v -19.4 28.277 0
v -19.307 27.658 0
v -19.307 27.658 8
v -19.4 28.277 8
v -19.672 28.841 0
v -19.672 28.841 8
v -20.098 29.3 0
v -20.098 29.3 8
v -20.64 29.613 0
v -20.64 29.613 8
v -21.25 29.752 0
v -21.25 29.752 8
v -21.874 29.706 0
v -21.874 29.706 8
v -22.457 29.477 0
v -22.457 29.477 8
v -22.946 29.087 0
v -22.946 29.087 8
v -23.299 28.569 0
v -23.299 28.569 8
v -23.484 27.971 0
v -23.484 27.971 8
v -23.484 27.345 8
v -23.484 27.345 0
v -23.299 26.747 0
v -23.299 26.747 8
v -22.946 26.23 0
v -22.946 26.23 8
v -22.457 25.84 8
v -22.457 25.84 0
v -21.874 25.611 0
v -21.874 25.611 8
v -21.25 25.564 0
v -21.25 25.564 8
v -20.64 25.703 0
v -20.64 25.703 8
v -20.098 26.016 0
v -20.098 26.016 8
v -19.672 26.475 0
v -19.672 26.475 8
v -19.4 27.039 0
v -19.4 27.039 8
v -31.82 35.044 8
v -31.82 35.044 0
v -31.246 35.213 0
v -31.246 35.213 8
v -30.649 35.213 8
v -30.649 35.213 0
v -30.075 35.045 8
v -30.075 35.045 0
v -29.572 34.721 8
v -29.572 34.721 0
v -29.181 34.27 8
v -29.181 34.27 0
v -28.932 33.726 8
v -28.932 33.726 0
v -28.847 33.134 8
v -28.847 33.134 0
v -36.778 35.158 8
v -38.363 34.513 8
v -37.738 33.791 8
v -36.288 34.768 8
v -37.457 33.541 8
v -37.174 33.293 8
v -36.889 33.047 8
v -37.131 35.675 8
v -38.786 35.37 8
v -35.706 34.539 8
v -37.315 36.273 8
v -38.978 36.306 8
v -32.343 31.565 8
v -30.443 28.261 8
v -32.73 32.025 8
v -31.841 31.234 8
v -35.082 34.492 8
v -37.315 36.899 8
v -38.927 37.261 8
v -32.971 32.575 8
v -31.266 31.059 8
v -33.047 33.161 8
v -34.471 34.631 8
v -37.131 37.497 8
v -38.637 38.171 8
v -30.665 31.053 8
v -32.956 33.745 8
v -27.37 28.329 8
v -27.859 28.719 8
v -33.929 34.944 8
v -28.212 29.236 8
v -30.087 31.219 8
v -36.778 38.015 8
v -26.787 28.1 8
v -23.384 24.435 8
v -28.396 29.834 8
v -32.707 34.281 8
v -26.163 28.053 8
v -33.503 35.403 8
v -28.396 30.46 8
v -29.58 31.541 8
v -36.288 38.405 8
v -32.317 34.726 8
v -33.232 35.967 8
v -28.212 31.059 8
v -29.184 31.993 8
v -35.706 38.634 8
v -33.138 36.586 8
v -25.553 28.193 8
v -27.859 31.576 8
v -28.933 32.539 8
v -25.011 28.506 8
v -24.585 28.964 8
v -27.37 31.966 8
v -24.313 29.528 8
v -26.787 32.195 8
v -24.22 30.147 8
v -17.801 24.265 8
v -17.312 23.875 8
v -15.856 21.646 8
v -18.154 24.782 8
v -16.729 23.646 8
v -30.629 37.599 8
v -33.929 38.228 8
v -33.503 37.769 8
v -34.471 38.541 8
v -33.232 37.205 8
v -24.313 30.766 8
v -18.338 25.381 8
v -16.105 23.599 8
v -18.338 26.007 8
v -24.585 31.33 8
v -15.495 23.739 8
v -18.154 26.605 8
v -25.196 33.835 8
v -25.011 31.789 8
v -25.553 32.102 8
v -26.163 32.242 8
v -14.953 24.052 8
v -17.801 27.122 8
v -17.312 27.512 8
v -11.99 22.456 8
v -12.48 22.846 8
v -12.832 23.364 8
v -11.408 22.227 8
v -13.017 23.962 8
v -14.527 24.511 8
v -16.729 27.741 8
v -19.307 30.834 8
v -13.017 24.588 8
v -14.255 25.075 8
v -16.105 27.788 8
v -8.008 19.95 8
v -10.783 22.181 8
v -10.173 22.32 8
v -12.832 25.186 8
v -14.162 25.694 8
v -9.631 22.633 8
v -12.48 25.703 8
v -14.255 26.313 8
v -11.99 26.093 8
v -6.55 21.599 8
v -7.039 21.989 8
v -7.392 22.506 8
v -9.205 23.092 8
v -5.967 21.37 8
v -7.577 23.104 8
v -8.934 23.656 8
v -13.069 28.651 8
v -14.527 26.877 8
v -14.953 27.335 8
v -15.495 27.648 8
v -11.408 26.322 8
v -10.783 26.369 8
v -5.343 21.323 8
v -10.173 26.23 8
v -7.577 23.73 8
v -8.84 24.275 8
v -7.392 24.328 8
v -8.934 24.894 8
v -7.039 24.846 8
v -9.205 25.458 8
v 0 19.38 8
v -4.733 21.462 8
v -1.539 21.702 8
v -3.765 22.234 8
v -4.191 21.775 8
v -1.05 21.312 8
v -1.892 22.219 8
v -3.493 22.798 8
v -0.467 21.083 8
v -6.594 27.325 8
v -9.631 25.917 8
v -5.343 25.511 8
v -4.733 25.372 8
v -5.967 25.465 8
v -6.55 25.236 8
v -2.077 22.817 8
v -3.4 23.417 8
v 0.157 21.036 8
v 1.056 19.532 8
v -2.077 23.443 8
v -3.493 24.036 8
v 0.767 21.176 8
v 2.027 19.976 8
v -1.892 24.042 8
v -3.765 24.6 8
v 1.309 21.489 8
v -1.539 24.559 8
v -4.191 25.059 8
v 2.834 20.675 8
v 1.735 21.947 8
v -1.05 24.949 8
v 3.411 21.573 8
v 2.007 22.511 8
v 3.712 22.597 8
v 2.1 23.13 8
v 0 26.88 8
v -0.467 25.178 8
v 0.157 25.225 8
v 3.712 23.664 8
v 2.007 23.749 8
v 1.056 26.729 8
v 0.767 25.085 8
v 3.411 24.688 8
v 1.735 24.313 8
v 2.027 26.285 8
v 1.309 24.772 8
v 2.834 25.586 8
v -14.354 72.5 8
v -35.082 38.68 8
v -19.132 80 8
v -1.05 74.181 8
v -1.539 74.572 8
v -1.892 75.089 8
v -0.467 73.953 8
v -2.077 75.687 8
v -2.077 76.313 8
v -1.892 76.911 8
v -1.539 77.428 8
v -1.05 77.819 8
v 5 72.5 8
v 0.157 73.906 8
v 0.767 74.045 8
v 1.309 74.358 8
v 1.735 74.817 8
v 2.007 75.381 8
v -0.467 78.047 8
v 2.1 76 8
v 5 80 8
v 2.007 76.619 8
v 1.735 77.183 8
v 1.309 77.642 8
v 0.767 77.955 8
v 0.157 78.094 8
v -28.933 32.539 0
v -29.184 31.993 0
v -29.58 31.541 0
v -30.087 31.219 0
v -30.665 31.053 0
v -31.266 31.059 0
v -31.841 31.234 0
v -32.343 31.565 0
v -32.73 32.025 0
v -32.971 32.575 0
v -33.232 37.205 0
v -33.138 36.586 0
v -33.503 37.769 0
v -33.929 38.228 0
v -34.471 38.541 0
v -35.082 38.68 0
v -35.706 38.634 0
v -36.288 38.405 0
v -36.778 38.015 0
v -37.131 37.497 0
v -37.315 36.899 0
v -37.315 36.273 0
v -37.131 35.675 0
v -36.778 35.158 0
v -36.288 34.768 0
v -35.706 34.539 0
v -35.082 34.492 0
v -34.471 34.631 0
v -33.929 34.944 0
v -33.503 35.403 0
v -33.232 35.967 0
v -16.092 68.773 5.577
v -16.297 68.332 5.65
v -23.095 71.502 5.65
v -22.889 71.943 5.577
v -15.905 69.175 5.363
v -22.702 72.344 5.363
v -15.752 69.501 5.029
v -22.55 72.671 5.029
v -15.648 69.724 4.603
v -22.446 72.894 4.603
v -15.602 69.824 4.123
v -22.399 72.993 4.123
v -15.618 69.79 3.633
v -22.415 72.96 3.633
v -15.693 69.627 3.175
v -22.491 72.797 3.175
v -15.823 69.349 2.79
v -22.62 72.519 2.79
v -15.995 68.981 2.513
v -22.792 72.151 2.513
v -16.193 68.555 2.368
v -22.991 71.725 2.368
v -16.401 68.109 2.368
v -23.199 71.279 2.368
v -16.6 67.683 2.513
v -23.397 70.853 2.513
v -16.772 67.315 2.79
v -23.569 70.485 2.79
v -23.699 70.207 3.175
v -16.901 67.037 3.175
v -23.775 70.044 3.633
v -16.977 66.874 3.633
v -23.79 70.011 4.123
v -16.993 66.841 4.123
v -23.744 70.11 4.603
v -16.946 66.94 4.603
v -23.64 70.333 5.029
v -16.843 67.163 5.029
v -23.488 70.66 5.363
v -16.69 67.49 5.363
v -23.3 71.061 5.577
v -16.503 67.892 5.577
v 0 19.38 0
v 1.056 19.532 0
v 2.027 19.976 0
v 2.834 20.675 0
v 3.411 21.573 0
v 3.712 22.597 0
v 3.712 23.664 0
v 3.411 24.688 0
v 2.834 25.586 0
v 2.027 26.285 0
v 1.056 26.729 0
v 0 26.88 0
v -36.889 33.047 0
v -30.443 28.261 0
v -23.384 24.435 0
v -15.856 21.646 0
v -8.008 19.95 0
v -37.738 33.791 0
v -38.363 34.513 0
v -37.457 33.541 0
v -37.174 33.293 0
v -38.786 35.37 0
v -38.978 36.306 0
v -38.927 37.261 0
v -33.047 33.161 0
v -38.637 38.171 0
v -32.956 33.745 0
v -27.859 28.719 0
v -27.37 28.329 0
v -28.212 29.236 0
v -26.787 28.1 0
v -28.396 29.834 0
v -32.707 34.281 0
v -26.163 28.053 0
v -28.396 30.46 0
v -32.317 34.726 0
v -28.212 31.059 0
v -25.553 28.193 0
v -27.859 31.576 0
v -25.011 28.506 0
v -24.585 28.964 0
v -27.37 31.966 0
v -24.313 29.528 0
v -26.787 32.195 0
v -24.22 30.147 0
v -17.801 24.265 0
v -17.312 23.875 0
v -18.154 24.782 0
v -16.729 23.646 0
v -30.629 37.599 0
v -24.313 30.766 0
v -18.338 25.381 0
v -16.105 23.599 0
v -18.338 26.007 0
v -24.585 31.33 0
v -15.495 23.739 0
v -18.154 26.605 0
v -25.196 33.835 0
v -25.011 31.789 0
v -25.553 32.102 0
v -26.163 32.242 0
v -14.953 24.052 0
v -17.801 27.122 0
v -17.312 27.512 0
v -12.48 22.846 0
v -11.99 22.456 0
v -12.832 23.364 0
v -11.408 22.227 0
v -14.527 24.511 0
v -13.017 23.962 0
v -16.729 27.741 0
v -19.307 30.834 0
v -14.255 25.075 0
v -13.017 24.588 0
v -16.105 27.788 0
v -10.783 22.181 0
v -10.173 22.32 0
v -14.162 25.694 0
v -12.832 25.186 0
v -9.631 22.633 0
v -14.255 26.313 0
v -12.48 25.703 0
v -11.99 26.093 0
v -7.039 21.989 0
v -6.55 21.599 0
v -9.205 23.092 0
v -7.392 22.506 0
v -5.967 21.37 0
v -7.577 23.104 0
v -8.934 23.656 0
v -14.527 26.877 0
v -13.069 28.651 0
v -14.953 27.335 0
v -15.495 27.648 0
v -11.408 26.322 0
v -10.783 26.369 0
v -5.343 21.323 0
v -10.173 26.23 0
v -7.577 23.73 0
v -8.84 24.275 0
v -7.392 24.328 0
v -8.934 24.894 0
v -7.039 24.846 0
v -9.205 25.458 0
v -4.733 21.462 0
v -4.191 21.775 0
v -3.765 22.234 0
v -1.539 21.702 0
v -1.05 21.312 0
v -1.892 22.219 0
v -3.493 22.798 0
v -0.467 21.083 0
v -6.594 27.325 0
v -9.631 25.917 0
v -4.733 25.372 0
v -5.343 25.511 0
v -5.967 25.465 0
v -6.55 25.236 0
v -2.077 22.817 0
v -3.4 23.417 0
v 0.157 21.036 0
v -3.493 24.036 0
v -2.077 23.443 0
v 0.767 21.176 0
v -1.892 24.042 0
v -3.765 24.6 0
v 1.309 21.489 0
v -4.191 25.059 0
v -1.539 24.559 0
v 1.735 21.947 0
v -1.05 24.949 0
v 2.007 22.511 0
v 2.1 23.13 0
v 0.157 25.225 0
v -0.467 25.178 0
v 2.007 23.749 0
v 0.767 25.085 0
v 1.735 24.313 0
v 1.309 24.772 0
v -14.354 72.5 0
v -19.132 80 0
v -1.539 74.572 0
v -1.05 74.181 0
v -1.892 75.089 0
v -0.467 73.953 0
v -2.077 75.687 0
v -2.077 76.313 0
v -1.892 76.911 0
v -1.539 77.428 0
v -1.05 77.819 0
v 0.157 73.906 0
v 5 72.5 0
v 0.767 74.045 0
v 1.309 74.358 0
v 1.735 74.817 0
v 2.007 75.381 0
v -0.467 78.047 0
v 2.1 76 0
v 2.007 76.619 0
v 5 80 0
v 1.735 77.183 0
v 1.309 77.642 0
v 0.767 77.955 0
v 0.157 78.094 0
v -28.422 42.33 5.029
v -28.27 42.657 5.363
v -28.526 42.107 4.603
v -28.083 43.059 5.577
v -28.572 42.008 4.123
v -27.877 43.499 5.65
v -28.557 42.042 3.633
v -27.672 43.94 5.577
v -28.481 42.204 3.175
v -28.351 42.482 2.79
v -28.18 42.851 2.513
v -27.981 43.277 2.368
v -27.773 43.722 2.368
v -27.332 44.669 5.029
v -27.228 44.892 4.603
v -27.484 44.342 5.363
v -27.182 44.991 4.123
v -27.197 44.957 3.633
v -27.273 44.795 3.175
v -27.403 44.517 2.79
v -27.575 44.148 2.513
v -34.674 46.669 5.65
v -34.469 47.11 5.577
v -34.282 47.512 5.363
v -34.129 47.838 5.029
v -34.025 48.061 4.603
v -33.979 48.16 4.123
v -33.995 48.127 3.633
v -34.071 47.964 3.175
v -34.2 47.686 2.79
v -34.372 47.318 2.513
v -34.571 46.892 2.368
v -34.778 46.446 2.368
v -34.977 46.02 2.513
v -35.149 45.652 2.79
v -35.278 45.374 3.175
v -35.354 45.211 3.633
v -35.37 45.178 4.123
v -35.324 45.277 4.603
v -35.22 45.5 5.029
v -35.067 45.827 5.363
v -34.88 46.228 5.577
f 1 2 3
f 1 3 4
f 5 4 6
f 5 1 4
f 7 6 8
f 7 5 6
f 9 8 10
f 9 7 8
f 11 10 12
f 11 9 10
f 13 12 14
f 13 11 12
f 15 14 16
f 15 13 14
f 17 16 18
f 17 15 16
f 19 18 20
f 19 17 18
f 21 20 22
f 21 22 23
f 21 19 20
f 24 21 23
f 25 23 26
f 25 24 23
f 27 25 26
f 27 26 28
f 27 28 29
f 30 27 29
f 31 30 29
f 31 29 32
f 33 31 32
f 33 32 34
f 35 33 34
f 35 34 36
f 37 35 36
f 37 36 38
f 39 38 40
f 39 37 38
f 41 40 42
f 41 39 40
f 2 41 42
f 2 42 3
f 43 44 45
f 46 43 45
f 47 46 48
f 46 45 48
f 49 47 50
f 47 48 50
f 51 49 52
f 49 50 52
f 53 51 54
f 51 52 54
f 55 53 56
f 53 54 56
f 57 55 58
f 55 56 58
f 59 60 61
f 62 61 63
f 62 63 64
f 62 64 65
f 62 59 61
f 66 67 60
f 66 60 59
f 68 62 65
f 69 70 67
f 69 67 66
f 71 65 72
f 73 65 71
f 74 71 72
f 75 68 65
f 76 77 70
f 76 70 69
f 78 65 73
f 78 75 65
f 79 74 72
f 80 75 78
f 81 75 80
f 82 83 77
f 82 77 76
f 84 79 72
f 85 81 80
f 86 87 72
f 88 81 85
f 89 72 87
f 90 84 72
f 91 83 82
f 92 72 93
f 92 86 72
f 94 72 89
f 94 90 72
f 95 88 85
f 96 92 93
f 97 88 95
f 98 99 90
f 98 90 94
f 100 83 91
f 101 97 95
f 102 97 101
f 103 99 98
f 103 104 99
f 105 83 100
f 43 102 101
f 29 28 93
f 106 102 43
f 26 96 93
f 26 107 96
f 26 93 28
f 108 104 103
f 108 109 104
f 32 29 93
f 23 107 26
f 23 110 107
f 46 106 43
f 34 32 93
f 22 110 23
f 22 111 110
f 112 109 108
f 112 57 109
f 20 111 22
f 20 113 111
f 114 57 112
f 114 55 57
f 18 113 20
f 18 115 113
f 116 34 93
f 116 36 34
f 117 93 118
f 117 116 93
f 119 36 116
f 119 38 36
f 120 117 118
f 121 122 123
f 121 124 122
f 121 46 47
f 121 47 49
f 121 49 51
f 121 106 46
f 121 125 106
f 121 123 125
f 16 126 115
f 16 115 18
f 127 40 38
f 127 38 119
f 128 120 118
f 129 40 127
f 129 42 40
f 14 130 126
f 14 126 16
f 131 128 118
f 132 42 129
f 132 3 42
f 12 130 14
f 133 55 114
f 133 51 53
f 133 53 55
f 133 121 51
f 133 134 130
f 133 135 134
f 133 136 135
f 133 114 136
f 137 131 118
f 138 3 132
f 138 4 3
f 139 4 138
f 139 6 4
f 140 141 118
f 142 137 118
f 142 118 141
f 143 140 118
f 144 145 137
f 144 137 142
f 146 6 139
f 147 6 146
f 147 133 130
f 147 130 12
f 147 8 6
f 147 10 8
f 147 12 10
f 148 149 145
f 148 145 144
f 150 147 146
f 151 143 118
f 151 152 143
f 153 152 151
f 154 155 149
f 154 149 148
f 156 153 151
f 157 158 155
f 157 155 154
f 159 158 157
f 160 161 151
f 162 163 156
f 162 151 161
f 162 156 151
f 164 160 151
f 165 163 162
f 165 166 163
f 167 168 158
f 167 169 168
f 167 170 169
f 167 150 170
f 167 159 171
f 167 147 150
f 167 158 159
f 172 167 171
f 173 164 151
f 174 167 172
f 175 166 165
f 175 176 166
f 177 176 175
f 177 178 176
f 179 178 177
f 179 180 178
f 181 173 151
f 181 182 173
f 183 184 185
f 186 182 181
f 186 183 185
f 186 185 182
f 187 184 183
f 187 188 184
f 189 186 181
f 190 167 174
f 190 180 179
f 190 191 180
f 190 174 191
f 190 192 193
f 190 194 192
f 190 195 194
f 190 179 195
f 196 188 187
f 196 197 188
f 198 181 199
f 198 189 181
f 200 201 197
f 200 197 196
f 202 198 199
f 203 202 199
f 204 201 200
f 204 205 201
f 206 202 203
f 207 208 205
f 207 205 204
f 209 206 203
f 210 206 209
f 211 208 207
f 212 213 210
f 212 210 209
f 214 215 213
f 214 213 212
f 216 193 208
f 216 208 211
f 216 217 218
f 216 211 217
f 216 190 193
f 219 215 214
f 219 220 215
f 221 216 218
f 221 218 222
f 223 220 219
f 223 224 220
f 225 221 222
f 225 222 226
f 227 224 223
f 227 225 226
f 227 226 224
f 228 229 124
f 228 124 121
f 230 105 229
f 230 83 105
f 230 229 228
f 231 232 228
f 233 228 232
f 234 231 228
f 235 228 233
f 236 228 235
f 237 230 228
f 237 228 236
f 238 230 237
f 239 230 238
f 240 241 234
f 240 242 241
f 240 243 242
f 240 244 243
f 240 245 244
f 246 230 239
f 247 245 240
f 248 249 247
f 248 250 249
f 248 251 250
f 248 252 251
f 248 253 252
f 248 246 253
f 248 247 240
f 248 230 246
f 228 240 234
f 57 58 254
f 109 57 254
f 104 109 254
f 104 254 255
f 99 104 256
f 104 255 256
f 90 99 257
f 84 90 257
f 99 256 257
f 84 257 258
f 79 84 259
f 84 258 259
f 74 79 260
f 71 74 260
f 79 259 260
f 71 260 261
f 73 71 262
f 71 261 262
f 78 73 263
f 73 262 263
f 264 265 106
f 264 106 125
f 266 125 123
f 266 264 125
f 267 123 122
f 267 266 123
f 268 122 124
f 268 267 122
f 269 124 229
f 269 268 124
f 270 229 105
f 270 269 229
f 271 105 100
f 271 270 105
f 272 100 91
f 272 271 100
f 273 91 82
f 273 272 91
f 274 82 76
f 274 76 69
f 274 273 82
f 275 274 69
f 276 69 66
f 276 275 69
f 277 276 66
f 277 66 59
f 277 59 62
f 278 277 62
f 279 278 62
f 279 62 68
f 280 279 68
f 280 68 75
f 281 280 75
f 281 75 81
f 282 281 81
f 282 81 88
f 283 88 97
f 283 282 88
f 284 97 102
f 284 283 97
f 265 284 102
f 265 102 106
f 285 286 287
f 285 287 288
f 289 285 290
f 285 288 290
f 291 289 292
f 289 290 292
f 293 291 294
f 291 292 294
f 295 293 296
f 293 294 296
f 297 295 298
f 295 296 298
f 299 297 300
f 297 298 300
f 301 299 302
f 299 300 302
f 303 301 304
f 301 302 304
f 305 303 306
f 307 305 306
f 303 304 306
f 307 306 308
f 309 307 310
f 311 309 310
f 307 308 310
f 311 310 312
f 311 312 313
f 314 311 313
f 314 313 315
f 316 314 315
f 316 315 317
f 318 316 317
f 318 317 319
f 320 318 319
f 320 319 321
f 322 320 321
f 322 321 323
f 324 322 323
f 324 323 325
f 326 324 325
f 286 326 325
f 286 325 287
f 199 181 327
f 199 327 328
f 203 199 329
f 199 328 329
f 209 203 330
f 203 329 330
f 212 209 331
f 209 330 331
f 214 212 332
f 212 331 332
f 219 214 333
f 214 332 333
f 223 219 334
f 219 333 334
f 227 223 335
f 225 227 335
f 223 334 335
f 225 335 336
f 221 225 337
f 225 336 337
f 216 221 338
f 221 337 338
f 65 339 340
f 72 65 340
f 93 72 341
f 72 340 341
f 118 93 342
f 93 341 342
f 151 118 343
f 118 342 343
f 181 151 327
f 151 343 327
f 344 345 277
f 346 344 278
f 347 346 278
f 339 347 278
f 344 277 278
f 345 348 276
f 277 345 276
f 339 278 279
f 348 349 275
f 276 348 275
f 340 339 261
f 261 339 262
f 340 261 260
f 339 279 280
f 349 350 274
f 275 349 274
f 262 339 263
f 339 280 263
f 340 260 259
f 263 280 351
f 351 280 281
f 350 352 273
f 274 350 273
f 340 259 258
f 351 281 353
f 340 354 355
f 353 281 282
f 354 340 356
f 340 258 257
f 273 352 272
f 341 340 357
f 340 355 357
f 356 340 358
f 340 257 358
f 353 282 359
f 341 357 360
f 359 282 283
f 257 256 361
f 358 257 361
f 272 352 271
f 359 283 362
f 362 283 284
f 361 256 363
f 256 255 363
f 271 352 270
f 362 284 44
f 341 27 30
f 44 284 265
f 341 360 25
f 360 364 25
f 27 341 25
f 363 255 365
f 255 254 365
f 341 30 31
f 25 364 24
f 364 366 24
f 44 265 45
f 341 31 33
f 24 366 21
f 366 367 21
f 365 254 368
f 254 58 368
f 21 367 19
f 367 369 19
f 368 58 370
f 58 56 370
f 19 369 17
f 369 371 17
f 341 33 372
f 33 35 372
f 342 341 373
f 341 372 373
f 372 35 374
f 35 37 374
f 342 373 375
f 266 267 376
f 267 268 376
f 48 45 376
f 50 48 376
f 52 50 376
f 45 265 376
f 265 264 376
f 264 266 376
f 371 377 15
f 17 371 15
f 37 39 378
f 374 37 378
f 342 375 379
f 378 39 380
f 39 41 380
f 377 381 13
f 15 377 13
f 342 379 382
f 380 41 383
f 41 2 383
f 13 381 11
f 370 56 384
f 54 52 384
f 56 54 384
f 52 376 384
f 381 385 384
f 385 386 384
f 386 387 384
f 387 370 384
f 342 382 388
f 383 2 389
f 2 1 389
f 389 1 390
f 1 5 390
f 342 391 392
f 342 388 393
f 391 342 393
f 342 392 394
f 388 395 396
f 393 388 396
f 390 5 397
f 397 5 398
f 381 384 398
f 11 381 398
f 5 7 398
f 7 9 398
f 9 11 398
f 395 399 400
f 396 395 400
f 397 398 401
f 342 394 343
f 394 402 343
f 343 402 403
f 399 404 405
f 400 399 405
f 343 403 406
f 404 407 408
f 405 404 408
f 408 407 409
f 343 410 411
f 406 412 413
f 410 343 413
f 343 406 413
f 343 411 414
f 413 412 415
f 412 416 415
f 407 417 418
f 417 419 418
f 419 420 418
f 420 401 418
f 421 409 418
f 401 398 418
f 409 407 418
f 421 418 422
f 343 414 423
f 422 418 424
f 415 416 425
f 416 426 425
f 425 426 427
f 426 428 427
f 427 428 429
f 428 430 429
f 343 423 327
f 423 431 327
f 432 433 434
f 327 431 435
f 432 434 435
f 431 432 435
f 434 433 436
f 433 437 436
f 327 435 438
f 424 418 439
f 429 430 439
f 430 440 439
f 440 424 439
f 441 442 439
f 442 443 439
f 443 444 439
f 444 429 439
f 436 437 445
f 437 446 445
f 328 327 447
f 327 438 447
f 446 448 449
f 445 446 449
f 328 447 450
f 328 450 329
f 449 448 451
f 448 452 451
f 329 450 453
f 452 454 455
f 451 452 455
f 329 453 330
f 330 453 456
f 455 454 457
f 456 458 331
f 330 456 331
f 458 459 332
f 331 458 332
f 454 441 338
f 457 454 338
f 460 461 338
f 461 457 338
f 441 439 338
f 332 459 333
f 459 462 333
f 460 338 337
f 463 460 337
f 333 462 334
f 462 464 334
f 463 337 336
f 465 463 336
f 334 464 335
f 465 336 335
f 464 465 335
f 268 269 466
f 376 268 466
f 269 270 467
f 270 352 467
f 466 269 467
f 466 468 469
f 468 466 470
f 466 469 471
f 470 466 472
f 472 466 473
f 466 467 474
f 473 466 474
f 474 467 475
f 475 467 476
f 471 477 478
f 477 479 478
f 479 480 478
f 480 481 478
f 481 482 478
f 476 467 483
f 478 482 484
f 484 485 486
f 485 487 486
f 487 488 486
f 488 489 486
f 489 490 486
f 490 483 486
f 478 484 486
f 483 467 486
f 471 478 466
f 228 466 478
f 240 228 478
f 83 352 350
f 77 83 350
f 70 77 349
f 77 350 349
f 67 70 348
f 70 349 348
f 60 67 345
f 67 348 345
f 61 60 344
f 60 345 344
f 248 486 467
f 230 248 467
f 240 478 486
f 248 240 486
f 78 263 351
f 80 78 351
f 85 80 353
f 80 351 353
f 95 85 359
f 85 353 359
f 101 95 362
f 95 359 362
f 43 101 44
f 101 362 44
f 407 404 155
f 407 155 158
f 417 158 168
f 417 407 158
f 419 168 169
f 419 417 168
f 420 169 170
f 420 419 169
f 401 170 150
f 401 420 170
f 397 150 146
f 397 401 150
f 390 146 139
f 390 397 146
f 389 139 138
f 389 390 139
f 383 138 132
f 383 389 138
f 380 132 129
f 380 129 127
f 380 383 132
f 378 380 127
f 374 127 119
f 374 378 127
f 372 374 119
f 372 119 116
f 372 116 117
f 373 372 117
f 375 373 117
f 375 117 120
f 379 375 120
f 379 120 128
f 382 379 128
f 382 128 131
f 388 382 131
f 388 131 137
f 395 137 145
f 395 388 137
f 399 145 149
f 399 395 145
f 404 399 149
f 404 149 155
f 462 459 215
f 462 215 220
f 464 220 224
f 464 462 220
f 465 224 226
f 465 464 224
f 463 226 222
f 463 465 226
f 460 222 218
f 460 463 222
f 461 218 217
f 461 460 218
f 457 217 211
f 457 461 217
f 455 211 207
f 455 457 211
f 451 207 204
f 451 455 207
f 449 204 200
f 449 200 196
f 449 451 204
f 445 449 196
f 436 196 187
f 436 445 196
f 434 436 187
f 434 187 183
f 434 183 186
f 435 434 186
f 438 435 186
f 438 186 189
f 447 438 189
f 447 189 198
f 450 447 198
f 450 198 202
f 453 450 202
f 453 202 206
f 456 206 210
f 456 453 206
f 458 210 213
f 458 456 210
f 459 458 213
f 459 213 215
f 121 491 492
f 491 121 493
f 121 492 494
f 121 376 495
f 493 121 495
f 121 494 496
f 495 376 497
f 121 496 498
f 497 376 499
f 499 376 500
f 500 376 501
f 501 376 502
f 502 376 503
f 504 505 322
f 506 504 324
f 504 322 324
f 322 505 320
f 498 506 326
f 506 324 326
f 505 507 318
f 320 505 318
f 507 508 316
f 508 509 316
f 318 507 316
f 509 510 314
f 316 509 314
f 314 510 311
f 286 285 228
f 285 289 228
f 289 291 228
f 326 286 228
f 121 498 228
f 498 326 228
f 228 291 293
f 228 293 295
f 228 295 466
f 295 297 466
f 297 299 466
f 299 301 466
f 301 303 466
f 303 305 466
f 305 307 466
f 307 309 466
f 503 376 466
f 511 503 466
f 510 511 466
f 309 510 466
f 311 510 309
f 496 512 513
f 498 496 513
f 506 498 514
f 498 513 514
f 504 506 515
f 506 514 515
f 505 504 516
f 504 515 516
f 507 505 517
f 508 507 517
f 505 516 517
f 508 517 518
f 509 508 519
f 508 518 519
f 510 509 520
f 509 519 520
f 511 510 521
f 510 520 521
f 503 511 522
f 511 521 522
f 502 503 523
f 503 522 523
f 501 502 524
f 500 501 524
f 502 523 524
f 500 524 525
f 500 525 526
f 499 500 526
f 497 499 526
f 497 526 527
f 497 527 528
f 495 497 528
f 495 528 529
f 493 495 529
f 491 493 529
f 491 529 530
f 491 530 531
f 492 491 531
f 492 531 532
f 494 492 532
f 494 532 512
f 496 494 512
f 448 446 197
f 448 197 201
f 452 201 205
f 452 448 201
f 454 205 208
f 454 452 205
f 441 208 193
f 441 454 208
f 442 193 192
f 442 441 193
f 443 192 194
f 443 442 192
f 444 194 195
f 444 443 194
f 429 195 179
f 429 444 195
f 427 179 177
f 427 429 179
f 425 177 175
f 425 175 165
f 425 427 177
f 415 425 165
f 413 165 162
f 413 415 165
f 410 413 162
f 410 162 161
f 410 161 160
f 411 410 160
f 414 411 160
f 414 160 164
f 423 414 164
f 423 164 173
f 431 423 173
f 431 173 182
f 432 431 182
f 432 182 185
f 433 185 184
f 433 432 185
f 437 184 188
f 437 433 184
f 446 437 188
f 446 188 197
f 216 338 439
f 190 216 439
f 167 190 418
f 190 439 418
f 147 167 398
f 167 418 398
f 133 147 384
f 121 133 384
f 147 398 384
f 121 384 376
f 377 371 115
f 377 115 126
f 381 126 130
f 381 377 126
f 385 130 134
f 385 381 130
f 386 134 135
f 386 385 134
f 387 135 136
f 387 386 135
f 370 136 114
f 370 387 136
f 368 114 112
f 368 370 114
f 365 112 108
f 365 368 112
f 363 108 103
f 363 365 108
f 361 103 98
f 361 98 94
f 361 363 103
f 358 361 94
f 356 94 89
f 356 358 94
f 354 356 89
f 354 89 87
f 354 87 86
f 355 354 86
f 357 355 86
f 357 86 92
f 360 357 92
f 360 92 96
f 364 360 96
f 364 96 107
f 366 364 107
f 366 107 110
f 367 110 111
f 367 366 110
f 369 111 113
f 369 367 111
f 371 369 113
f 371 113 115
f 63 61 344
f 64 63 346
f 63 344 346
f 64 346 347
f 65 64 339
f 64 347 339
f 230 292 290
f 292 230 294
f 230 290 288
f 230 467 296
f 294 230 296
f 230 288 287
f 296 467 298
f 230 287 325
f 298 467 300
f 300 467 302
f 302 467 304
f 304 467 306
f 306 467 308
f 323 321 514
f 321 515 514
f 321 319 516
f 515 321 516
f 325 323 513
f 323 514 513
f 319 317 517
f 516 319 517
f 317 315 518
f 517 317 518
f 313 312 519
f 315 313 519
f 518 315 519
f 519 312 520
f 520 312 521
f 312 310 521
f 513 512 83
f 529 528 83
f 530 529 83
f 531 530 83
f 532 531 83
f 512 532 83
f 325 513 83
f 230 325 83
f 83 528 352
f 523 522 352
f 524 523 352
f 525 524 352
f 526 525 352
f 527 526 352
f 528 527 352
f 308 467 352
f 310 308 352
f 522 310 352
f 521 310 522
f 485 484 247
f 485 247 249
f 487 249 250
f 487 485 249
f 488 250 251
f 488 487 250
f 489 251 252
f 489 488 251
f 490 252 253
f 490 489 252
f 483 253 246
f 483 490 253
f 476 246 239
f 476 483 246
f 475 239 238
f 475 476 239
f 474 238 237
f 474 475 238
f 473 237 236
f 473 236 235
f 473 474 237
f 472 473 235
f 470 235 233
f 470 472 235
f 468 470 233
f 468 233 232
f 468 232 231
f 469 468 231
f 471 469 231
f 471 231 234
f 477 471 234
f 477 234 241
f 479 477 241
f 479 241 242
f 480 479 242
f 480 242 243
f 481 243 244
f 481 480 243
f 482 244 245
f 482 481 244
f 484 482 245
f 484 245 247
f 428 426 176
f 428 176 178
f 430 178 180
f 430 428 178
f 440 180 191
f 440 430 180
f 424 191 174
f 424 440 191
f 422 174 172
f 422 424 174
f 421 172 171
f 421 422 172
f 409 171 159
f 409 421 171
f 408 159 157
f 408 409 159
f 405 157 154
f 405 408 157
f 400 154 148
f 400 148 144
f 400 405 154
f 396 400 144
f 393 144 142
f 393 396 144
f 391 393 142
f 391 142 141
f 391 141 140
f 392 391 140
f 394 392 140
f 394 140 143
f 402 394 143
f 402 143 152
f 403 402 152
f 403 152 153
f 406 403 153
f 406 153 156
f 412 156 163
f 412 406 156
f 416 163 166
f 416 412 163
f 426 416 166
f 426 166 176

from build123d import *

# Parameters (mm, degrees)
SKETCH1_R           = 2.1
BOSS_EXTRUDE1_DEPTH = 8
CUT_EXTRUDE1_REACH  = 49.49
SKETCH2_R           = 1.65


with BuildPart() as part:
    # Sketch1 → Boss-Extrude1 (new body)
    with BuildSketch(Plane.XY):
        Polygon((-14.353967242, 72.5), (5, 72.5), (5, 80), (-19.131994198, 80), (-12.334685795, 76.830363037), align=None)
        with Locations((0, 76)):
            Circle(SKETCH1_R, mode=Mode.SUBTRACT)
        Polygon((-19.131994198, 72.5), (-14.353967242, 72.5), (-12.334685795, 76.830363037), (-19.131994198, 80), align=None)
        with BuildLine():
            Line((-30.628506806, 37.599137276), (-14.353967242, 72.5))
            Line((-14.353967242, 72.5), (-19.131994198, 72.5))
            Line((-19.131994198, 72.5), (-19.131994198, 80))
            Line((-19.131994198, 80), (-38.637128487, 38.171104532))
            ThreePointArc((-38.637128487, 38.171104532), (-35.992554118, 40.259685439), (-32.739034841, 39.381872183))
            ThreePointArc((-32.739034841, 39.381872183), (-31.696306875, 38.475663662), (-30.628506806, 37.599137276))
        make_face()
        with BuildLine():
            Line((-31.819822815, 35.044351851), (-30.628506806, 37.599137276))
            ThreePointArc((-30.628506806, 37.599137276), (-31.696306875, 38.475663662), (-32.739034841, 39.381872183))
            ThreePointArc((-32.739034841, 39.381872183), (-35.992554118, 40.259685439), (-38.637128487, 38.171104532))
            ThreePointArc((-38.637128487, 38.171104532), (-38.911873793, 35.832206175), (-37.737913805, 33.790699757))
            ThreePointArc((-37.737913805, 33.790699757), (-37.315296786, 33.416625413), (-36.888971991, 33.046782299))
            Line((-36.888971991, 33.046782299), (-33.490317789, 31.461963818))
            Line((-33.490317789, 31.461963818), (-32.97126033, 32.575086132))
            ThreePointArc((-32.97126033, 32.575086132), (-32.850330683, 34.021790637), (-31.819822815, 35.044351851))
        make_face()
        with Locations((-35.238474323, 36.58628597)):
            Circle(SKETCH1_R, mode=Mode.SUBTRACT)
        with BuildLine():
            ThreePointArc((0, 26.880434783), (-16.224950018, 29.637486219), (-30.628506806, 37.599137276))
            Line((-30.628506806, 37.599137276), (-31.819822815, 35.044351851))
            ThreePointArc((-31.819822815, 35.044351851), (-29.811908313, 34.901033754), (-28.847084331, 33.134292287))
            ThreePointArc((-28.847084331, 33.134292287), (-30.664922673, 31.053334623), (-32.97126033, 32.575086132))
            Line((-32.97126033, 32.575086132), (-33.490317789, 31.461963818))
            Line((-33.490317789, 31.461963818), (-36.888971991, 33.046782299))
            ThreePointArc((-36.888971991, 33.046782299), (-19.669553306, 22.906838122), (0, 19.380434783))
            ThreePointArc((0, 19.380434783), (3.75, 23.130434783), (0, 26.880434783))
        make_face()
        with Locations((-26.319869018, 30.147460036)):
            Circle(SKETCH1_R, mode=Mode.SUBTRACT)
        with Locations((-21.407041065, 27.658201118)):
            Circle(SKETCH1_R, mode=Mode.SUBTRACT)
        with Locations((-16.261912507, 25.693527972)):
            Circle(SKETCH1_R, mode=Mode.SUBTRACT)
        with Locations((-10.940316211, 24.274760441)):
            Circle(SKETCH1_R, mode=Mode.SUBTRACT)
        with Locations((-5.5, 23.417294418)):
            Circle(SKETCH1_R, mode=Mode.SUBTRACT)
        with Locations((0, 23.130434783)):
            Circle(SKETCH1_R, mode=Mode.SUBTRACT)
    extrude(amount=BOSS_EXTRUDE1_DEPTH)

    # Sketch2 → Cut-Extrude1 (cut, up to next)
    with BuildSketch(Plane(origin=(-46.356679233, 21.616474533, 0), x_dir=(0, 0, 1), z_dir=(-0.906307787, 0.422618262, 0)), mode=Mode.PRIVATE) as cut_extrude1_sk1:
        with Locations((4, 55.04255297)):
            Circle(SKETCH2_R)
    cut_extrude1_tool1 = extrude(cut_extrude1_sk1.sketch, amount=-CUT_EXTRUDE1_REACH, mode=Mode.PRIVATE) & part.part
    add(cut_extrude1_tool1.solids().sort_by_distance((-23.094691, 71.501969, 4))[0], mode=Mode.SUBTRACT)
    # Sketch2 → Cut-Extrude1 (cut, up to next)
    with BuildSketch(Plane(origin=(-46.356679233, 21.616474533, 0), x_dir=(0, 0, 1), z_dir=(-0.906307787, 0.422618262, 0)), mode=Mode.PRIVATE) as cut_extrude1_sk2:
        with Locations((4, 27.64255297)):
            Circle(SKETCH2_R)
    cut_extrude1_tool2 = extrude(cut_extrude1_sk2.sketch, amount=-CUT_EXTRUDE1_REACH, mode=Mode.PRIVATE) & part.part
    add(cut_extrude1_tool2.solids().sort_by_distance((-34.674432, 46.669136, 4))[0], mode=Mode.SUBTRACT)


solid = part.part
